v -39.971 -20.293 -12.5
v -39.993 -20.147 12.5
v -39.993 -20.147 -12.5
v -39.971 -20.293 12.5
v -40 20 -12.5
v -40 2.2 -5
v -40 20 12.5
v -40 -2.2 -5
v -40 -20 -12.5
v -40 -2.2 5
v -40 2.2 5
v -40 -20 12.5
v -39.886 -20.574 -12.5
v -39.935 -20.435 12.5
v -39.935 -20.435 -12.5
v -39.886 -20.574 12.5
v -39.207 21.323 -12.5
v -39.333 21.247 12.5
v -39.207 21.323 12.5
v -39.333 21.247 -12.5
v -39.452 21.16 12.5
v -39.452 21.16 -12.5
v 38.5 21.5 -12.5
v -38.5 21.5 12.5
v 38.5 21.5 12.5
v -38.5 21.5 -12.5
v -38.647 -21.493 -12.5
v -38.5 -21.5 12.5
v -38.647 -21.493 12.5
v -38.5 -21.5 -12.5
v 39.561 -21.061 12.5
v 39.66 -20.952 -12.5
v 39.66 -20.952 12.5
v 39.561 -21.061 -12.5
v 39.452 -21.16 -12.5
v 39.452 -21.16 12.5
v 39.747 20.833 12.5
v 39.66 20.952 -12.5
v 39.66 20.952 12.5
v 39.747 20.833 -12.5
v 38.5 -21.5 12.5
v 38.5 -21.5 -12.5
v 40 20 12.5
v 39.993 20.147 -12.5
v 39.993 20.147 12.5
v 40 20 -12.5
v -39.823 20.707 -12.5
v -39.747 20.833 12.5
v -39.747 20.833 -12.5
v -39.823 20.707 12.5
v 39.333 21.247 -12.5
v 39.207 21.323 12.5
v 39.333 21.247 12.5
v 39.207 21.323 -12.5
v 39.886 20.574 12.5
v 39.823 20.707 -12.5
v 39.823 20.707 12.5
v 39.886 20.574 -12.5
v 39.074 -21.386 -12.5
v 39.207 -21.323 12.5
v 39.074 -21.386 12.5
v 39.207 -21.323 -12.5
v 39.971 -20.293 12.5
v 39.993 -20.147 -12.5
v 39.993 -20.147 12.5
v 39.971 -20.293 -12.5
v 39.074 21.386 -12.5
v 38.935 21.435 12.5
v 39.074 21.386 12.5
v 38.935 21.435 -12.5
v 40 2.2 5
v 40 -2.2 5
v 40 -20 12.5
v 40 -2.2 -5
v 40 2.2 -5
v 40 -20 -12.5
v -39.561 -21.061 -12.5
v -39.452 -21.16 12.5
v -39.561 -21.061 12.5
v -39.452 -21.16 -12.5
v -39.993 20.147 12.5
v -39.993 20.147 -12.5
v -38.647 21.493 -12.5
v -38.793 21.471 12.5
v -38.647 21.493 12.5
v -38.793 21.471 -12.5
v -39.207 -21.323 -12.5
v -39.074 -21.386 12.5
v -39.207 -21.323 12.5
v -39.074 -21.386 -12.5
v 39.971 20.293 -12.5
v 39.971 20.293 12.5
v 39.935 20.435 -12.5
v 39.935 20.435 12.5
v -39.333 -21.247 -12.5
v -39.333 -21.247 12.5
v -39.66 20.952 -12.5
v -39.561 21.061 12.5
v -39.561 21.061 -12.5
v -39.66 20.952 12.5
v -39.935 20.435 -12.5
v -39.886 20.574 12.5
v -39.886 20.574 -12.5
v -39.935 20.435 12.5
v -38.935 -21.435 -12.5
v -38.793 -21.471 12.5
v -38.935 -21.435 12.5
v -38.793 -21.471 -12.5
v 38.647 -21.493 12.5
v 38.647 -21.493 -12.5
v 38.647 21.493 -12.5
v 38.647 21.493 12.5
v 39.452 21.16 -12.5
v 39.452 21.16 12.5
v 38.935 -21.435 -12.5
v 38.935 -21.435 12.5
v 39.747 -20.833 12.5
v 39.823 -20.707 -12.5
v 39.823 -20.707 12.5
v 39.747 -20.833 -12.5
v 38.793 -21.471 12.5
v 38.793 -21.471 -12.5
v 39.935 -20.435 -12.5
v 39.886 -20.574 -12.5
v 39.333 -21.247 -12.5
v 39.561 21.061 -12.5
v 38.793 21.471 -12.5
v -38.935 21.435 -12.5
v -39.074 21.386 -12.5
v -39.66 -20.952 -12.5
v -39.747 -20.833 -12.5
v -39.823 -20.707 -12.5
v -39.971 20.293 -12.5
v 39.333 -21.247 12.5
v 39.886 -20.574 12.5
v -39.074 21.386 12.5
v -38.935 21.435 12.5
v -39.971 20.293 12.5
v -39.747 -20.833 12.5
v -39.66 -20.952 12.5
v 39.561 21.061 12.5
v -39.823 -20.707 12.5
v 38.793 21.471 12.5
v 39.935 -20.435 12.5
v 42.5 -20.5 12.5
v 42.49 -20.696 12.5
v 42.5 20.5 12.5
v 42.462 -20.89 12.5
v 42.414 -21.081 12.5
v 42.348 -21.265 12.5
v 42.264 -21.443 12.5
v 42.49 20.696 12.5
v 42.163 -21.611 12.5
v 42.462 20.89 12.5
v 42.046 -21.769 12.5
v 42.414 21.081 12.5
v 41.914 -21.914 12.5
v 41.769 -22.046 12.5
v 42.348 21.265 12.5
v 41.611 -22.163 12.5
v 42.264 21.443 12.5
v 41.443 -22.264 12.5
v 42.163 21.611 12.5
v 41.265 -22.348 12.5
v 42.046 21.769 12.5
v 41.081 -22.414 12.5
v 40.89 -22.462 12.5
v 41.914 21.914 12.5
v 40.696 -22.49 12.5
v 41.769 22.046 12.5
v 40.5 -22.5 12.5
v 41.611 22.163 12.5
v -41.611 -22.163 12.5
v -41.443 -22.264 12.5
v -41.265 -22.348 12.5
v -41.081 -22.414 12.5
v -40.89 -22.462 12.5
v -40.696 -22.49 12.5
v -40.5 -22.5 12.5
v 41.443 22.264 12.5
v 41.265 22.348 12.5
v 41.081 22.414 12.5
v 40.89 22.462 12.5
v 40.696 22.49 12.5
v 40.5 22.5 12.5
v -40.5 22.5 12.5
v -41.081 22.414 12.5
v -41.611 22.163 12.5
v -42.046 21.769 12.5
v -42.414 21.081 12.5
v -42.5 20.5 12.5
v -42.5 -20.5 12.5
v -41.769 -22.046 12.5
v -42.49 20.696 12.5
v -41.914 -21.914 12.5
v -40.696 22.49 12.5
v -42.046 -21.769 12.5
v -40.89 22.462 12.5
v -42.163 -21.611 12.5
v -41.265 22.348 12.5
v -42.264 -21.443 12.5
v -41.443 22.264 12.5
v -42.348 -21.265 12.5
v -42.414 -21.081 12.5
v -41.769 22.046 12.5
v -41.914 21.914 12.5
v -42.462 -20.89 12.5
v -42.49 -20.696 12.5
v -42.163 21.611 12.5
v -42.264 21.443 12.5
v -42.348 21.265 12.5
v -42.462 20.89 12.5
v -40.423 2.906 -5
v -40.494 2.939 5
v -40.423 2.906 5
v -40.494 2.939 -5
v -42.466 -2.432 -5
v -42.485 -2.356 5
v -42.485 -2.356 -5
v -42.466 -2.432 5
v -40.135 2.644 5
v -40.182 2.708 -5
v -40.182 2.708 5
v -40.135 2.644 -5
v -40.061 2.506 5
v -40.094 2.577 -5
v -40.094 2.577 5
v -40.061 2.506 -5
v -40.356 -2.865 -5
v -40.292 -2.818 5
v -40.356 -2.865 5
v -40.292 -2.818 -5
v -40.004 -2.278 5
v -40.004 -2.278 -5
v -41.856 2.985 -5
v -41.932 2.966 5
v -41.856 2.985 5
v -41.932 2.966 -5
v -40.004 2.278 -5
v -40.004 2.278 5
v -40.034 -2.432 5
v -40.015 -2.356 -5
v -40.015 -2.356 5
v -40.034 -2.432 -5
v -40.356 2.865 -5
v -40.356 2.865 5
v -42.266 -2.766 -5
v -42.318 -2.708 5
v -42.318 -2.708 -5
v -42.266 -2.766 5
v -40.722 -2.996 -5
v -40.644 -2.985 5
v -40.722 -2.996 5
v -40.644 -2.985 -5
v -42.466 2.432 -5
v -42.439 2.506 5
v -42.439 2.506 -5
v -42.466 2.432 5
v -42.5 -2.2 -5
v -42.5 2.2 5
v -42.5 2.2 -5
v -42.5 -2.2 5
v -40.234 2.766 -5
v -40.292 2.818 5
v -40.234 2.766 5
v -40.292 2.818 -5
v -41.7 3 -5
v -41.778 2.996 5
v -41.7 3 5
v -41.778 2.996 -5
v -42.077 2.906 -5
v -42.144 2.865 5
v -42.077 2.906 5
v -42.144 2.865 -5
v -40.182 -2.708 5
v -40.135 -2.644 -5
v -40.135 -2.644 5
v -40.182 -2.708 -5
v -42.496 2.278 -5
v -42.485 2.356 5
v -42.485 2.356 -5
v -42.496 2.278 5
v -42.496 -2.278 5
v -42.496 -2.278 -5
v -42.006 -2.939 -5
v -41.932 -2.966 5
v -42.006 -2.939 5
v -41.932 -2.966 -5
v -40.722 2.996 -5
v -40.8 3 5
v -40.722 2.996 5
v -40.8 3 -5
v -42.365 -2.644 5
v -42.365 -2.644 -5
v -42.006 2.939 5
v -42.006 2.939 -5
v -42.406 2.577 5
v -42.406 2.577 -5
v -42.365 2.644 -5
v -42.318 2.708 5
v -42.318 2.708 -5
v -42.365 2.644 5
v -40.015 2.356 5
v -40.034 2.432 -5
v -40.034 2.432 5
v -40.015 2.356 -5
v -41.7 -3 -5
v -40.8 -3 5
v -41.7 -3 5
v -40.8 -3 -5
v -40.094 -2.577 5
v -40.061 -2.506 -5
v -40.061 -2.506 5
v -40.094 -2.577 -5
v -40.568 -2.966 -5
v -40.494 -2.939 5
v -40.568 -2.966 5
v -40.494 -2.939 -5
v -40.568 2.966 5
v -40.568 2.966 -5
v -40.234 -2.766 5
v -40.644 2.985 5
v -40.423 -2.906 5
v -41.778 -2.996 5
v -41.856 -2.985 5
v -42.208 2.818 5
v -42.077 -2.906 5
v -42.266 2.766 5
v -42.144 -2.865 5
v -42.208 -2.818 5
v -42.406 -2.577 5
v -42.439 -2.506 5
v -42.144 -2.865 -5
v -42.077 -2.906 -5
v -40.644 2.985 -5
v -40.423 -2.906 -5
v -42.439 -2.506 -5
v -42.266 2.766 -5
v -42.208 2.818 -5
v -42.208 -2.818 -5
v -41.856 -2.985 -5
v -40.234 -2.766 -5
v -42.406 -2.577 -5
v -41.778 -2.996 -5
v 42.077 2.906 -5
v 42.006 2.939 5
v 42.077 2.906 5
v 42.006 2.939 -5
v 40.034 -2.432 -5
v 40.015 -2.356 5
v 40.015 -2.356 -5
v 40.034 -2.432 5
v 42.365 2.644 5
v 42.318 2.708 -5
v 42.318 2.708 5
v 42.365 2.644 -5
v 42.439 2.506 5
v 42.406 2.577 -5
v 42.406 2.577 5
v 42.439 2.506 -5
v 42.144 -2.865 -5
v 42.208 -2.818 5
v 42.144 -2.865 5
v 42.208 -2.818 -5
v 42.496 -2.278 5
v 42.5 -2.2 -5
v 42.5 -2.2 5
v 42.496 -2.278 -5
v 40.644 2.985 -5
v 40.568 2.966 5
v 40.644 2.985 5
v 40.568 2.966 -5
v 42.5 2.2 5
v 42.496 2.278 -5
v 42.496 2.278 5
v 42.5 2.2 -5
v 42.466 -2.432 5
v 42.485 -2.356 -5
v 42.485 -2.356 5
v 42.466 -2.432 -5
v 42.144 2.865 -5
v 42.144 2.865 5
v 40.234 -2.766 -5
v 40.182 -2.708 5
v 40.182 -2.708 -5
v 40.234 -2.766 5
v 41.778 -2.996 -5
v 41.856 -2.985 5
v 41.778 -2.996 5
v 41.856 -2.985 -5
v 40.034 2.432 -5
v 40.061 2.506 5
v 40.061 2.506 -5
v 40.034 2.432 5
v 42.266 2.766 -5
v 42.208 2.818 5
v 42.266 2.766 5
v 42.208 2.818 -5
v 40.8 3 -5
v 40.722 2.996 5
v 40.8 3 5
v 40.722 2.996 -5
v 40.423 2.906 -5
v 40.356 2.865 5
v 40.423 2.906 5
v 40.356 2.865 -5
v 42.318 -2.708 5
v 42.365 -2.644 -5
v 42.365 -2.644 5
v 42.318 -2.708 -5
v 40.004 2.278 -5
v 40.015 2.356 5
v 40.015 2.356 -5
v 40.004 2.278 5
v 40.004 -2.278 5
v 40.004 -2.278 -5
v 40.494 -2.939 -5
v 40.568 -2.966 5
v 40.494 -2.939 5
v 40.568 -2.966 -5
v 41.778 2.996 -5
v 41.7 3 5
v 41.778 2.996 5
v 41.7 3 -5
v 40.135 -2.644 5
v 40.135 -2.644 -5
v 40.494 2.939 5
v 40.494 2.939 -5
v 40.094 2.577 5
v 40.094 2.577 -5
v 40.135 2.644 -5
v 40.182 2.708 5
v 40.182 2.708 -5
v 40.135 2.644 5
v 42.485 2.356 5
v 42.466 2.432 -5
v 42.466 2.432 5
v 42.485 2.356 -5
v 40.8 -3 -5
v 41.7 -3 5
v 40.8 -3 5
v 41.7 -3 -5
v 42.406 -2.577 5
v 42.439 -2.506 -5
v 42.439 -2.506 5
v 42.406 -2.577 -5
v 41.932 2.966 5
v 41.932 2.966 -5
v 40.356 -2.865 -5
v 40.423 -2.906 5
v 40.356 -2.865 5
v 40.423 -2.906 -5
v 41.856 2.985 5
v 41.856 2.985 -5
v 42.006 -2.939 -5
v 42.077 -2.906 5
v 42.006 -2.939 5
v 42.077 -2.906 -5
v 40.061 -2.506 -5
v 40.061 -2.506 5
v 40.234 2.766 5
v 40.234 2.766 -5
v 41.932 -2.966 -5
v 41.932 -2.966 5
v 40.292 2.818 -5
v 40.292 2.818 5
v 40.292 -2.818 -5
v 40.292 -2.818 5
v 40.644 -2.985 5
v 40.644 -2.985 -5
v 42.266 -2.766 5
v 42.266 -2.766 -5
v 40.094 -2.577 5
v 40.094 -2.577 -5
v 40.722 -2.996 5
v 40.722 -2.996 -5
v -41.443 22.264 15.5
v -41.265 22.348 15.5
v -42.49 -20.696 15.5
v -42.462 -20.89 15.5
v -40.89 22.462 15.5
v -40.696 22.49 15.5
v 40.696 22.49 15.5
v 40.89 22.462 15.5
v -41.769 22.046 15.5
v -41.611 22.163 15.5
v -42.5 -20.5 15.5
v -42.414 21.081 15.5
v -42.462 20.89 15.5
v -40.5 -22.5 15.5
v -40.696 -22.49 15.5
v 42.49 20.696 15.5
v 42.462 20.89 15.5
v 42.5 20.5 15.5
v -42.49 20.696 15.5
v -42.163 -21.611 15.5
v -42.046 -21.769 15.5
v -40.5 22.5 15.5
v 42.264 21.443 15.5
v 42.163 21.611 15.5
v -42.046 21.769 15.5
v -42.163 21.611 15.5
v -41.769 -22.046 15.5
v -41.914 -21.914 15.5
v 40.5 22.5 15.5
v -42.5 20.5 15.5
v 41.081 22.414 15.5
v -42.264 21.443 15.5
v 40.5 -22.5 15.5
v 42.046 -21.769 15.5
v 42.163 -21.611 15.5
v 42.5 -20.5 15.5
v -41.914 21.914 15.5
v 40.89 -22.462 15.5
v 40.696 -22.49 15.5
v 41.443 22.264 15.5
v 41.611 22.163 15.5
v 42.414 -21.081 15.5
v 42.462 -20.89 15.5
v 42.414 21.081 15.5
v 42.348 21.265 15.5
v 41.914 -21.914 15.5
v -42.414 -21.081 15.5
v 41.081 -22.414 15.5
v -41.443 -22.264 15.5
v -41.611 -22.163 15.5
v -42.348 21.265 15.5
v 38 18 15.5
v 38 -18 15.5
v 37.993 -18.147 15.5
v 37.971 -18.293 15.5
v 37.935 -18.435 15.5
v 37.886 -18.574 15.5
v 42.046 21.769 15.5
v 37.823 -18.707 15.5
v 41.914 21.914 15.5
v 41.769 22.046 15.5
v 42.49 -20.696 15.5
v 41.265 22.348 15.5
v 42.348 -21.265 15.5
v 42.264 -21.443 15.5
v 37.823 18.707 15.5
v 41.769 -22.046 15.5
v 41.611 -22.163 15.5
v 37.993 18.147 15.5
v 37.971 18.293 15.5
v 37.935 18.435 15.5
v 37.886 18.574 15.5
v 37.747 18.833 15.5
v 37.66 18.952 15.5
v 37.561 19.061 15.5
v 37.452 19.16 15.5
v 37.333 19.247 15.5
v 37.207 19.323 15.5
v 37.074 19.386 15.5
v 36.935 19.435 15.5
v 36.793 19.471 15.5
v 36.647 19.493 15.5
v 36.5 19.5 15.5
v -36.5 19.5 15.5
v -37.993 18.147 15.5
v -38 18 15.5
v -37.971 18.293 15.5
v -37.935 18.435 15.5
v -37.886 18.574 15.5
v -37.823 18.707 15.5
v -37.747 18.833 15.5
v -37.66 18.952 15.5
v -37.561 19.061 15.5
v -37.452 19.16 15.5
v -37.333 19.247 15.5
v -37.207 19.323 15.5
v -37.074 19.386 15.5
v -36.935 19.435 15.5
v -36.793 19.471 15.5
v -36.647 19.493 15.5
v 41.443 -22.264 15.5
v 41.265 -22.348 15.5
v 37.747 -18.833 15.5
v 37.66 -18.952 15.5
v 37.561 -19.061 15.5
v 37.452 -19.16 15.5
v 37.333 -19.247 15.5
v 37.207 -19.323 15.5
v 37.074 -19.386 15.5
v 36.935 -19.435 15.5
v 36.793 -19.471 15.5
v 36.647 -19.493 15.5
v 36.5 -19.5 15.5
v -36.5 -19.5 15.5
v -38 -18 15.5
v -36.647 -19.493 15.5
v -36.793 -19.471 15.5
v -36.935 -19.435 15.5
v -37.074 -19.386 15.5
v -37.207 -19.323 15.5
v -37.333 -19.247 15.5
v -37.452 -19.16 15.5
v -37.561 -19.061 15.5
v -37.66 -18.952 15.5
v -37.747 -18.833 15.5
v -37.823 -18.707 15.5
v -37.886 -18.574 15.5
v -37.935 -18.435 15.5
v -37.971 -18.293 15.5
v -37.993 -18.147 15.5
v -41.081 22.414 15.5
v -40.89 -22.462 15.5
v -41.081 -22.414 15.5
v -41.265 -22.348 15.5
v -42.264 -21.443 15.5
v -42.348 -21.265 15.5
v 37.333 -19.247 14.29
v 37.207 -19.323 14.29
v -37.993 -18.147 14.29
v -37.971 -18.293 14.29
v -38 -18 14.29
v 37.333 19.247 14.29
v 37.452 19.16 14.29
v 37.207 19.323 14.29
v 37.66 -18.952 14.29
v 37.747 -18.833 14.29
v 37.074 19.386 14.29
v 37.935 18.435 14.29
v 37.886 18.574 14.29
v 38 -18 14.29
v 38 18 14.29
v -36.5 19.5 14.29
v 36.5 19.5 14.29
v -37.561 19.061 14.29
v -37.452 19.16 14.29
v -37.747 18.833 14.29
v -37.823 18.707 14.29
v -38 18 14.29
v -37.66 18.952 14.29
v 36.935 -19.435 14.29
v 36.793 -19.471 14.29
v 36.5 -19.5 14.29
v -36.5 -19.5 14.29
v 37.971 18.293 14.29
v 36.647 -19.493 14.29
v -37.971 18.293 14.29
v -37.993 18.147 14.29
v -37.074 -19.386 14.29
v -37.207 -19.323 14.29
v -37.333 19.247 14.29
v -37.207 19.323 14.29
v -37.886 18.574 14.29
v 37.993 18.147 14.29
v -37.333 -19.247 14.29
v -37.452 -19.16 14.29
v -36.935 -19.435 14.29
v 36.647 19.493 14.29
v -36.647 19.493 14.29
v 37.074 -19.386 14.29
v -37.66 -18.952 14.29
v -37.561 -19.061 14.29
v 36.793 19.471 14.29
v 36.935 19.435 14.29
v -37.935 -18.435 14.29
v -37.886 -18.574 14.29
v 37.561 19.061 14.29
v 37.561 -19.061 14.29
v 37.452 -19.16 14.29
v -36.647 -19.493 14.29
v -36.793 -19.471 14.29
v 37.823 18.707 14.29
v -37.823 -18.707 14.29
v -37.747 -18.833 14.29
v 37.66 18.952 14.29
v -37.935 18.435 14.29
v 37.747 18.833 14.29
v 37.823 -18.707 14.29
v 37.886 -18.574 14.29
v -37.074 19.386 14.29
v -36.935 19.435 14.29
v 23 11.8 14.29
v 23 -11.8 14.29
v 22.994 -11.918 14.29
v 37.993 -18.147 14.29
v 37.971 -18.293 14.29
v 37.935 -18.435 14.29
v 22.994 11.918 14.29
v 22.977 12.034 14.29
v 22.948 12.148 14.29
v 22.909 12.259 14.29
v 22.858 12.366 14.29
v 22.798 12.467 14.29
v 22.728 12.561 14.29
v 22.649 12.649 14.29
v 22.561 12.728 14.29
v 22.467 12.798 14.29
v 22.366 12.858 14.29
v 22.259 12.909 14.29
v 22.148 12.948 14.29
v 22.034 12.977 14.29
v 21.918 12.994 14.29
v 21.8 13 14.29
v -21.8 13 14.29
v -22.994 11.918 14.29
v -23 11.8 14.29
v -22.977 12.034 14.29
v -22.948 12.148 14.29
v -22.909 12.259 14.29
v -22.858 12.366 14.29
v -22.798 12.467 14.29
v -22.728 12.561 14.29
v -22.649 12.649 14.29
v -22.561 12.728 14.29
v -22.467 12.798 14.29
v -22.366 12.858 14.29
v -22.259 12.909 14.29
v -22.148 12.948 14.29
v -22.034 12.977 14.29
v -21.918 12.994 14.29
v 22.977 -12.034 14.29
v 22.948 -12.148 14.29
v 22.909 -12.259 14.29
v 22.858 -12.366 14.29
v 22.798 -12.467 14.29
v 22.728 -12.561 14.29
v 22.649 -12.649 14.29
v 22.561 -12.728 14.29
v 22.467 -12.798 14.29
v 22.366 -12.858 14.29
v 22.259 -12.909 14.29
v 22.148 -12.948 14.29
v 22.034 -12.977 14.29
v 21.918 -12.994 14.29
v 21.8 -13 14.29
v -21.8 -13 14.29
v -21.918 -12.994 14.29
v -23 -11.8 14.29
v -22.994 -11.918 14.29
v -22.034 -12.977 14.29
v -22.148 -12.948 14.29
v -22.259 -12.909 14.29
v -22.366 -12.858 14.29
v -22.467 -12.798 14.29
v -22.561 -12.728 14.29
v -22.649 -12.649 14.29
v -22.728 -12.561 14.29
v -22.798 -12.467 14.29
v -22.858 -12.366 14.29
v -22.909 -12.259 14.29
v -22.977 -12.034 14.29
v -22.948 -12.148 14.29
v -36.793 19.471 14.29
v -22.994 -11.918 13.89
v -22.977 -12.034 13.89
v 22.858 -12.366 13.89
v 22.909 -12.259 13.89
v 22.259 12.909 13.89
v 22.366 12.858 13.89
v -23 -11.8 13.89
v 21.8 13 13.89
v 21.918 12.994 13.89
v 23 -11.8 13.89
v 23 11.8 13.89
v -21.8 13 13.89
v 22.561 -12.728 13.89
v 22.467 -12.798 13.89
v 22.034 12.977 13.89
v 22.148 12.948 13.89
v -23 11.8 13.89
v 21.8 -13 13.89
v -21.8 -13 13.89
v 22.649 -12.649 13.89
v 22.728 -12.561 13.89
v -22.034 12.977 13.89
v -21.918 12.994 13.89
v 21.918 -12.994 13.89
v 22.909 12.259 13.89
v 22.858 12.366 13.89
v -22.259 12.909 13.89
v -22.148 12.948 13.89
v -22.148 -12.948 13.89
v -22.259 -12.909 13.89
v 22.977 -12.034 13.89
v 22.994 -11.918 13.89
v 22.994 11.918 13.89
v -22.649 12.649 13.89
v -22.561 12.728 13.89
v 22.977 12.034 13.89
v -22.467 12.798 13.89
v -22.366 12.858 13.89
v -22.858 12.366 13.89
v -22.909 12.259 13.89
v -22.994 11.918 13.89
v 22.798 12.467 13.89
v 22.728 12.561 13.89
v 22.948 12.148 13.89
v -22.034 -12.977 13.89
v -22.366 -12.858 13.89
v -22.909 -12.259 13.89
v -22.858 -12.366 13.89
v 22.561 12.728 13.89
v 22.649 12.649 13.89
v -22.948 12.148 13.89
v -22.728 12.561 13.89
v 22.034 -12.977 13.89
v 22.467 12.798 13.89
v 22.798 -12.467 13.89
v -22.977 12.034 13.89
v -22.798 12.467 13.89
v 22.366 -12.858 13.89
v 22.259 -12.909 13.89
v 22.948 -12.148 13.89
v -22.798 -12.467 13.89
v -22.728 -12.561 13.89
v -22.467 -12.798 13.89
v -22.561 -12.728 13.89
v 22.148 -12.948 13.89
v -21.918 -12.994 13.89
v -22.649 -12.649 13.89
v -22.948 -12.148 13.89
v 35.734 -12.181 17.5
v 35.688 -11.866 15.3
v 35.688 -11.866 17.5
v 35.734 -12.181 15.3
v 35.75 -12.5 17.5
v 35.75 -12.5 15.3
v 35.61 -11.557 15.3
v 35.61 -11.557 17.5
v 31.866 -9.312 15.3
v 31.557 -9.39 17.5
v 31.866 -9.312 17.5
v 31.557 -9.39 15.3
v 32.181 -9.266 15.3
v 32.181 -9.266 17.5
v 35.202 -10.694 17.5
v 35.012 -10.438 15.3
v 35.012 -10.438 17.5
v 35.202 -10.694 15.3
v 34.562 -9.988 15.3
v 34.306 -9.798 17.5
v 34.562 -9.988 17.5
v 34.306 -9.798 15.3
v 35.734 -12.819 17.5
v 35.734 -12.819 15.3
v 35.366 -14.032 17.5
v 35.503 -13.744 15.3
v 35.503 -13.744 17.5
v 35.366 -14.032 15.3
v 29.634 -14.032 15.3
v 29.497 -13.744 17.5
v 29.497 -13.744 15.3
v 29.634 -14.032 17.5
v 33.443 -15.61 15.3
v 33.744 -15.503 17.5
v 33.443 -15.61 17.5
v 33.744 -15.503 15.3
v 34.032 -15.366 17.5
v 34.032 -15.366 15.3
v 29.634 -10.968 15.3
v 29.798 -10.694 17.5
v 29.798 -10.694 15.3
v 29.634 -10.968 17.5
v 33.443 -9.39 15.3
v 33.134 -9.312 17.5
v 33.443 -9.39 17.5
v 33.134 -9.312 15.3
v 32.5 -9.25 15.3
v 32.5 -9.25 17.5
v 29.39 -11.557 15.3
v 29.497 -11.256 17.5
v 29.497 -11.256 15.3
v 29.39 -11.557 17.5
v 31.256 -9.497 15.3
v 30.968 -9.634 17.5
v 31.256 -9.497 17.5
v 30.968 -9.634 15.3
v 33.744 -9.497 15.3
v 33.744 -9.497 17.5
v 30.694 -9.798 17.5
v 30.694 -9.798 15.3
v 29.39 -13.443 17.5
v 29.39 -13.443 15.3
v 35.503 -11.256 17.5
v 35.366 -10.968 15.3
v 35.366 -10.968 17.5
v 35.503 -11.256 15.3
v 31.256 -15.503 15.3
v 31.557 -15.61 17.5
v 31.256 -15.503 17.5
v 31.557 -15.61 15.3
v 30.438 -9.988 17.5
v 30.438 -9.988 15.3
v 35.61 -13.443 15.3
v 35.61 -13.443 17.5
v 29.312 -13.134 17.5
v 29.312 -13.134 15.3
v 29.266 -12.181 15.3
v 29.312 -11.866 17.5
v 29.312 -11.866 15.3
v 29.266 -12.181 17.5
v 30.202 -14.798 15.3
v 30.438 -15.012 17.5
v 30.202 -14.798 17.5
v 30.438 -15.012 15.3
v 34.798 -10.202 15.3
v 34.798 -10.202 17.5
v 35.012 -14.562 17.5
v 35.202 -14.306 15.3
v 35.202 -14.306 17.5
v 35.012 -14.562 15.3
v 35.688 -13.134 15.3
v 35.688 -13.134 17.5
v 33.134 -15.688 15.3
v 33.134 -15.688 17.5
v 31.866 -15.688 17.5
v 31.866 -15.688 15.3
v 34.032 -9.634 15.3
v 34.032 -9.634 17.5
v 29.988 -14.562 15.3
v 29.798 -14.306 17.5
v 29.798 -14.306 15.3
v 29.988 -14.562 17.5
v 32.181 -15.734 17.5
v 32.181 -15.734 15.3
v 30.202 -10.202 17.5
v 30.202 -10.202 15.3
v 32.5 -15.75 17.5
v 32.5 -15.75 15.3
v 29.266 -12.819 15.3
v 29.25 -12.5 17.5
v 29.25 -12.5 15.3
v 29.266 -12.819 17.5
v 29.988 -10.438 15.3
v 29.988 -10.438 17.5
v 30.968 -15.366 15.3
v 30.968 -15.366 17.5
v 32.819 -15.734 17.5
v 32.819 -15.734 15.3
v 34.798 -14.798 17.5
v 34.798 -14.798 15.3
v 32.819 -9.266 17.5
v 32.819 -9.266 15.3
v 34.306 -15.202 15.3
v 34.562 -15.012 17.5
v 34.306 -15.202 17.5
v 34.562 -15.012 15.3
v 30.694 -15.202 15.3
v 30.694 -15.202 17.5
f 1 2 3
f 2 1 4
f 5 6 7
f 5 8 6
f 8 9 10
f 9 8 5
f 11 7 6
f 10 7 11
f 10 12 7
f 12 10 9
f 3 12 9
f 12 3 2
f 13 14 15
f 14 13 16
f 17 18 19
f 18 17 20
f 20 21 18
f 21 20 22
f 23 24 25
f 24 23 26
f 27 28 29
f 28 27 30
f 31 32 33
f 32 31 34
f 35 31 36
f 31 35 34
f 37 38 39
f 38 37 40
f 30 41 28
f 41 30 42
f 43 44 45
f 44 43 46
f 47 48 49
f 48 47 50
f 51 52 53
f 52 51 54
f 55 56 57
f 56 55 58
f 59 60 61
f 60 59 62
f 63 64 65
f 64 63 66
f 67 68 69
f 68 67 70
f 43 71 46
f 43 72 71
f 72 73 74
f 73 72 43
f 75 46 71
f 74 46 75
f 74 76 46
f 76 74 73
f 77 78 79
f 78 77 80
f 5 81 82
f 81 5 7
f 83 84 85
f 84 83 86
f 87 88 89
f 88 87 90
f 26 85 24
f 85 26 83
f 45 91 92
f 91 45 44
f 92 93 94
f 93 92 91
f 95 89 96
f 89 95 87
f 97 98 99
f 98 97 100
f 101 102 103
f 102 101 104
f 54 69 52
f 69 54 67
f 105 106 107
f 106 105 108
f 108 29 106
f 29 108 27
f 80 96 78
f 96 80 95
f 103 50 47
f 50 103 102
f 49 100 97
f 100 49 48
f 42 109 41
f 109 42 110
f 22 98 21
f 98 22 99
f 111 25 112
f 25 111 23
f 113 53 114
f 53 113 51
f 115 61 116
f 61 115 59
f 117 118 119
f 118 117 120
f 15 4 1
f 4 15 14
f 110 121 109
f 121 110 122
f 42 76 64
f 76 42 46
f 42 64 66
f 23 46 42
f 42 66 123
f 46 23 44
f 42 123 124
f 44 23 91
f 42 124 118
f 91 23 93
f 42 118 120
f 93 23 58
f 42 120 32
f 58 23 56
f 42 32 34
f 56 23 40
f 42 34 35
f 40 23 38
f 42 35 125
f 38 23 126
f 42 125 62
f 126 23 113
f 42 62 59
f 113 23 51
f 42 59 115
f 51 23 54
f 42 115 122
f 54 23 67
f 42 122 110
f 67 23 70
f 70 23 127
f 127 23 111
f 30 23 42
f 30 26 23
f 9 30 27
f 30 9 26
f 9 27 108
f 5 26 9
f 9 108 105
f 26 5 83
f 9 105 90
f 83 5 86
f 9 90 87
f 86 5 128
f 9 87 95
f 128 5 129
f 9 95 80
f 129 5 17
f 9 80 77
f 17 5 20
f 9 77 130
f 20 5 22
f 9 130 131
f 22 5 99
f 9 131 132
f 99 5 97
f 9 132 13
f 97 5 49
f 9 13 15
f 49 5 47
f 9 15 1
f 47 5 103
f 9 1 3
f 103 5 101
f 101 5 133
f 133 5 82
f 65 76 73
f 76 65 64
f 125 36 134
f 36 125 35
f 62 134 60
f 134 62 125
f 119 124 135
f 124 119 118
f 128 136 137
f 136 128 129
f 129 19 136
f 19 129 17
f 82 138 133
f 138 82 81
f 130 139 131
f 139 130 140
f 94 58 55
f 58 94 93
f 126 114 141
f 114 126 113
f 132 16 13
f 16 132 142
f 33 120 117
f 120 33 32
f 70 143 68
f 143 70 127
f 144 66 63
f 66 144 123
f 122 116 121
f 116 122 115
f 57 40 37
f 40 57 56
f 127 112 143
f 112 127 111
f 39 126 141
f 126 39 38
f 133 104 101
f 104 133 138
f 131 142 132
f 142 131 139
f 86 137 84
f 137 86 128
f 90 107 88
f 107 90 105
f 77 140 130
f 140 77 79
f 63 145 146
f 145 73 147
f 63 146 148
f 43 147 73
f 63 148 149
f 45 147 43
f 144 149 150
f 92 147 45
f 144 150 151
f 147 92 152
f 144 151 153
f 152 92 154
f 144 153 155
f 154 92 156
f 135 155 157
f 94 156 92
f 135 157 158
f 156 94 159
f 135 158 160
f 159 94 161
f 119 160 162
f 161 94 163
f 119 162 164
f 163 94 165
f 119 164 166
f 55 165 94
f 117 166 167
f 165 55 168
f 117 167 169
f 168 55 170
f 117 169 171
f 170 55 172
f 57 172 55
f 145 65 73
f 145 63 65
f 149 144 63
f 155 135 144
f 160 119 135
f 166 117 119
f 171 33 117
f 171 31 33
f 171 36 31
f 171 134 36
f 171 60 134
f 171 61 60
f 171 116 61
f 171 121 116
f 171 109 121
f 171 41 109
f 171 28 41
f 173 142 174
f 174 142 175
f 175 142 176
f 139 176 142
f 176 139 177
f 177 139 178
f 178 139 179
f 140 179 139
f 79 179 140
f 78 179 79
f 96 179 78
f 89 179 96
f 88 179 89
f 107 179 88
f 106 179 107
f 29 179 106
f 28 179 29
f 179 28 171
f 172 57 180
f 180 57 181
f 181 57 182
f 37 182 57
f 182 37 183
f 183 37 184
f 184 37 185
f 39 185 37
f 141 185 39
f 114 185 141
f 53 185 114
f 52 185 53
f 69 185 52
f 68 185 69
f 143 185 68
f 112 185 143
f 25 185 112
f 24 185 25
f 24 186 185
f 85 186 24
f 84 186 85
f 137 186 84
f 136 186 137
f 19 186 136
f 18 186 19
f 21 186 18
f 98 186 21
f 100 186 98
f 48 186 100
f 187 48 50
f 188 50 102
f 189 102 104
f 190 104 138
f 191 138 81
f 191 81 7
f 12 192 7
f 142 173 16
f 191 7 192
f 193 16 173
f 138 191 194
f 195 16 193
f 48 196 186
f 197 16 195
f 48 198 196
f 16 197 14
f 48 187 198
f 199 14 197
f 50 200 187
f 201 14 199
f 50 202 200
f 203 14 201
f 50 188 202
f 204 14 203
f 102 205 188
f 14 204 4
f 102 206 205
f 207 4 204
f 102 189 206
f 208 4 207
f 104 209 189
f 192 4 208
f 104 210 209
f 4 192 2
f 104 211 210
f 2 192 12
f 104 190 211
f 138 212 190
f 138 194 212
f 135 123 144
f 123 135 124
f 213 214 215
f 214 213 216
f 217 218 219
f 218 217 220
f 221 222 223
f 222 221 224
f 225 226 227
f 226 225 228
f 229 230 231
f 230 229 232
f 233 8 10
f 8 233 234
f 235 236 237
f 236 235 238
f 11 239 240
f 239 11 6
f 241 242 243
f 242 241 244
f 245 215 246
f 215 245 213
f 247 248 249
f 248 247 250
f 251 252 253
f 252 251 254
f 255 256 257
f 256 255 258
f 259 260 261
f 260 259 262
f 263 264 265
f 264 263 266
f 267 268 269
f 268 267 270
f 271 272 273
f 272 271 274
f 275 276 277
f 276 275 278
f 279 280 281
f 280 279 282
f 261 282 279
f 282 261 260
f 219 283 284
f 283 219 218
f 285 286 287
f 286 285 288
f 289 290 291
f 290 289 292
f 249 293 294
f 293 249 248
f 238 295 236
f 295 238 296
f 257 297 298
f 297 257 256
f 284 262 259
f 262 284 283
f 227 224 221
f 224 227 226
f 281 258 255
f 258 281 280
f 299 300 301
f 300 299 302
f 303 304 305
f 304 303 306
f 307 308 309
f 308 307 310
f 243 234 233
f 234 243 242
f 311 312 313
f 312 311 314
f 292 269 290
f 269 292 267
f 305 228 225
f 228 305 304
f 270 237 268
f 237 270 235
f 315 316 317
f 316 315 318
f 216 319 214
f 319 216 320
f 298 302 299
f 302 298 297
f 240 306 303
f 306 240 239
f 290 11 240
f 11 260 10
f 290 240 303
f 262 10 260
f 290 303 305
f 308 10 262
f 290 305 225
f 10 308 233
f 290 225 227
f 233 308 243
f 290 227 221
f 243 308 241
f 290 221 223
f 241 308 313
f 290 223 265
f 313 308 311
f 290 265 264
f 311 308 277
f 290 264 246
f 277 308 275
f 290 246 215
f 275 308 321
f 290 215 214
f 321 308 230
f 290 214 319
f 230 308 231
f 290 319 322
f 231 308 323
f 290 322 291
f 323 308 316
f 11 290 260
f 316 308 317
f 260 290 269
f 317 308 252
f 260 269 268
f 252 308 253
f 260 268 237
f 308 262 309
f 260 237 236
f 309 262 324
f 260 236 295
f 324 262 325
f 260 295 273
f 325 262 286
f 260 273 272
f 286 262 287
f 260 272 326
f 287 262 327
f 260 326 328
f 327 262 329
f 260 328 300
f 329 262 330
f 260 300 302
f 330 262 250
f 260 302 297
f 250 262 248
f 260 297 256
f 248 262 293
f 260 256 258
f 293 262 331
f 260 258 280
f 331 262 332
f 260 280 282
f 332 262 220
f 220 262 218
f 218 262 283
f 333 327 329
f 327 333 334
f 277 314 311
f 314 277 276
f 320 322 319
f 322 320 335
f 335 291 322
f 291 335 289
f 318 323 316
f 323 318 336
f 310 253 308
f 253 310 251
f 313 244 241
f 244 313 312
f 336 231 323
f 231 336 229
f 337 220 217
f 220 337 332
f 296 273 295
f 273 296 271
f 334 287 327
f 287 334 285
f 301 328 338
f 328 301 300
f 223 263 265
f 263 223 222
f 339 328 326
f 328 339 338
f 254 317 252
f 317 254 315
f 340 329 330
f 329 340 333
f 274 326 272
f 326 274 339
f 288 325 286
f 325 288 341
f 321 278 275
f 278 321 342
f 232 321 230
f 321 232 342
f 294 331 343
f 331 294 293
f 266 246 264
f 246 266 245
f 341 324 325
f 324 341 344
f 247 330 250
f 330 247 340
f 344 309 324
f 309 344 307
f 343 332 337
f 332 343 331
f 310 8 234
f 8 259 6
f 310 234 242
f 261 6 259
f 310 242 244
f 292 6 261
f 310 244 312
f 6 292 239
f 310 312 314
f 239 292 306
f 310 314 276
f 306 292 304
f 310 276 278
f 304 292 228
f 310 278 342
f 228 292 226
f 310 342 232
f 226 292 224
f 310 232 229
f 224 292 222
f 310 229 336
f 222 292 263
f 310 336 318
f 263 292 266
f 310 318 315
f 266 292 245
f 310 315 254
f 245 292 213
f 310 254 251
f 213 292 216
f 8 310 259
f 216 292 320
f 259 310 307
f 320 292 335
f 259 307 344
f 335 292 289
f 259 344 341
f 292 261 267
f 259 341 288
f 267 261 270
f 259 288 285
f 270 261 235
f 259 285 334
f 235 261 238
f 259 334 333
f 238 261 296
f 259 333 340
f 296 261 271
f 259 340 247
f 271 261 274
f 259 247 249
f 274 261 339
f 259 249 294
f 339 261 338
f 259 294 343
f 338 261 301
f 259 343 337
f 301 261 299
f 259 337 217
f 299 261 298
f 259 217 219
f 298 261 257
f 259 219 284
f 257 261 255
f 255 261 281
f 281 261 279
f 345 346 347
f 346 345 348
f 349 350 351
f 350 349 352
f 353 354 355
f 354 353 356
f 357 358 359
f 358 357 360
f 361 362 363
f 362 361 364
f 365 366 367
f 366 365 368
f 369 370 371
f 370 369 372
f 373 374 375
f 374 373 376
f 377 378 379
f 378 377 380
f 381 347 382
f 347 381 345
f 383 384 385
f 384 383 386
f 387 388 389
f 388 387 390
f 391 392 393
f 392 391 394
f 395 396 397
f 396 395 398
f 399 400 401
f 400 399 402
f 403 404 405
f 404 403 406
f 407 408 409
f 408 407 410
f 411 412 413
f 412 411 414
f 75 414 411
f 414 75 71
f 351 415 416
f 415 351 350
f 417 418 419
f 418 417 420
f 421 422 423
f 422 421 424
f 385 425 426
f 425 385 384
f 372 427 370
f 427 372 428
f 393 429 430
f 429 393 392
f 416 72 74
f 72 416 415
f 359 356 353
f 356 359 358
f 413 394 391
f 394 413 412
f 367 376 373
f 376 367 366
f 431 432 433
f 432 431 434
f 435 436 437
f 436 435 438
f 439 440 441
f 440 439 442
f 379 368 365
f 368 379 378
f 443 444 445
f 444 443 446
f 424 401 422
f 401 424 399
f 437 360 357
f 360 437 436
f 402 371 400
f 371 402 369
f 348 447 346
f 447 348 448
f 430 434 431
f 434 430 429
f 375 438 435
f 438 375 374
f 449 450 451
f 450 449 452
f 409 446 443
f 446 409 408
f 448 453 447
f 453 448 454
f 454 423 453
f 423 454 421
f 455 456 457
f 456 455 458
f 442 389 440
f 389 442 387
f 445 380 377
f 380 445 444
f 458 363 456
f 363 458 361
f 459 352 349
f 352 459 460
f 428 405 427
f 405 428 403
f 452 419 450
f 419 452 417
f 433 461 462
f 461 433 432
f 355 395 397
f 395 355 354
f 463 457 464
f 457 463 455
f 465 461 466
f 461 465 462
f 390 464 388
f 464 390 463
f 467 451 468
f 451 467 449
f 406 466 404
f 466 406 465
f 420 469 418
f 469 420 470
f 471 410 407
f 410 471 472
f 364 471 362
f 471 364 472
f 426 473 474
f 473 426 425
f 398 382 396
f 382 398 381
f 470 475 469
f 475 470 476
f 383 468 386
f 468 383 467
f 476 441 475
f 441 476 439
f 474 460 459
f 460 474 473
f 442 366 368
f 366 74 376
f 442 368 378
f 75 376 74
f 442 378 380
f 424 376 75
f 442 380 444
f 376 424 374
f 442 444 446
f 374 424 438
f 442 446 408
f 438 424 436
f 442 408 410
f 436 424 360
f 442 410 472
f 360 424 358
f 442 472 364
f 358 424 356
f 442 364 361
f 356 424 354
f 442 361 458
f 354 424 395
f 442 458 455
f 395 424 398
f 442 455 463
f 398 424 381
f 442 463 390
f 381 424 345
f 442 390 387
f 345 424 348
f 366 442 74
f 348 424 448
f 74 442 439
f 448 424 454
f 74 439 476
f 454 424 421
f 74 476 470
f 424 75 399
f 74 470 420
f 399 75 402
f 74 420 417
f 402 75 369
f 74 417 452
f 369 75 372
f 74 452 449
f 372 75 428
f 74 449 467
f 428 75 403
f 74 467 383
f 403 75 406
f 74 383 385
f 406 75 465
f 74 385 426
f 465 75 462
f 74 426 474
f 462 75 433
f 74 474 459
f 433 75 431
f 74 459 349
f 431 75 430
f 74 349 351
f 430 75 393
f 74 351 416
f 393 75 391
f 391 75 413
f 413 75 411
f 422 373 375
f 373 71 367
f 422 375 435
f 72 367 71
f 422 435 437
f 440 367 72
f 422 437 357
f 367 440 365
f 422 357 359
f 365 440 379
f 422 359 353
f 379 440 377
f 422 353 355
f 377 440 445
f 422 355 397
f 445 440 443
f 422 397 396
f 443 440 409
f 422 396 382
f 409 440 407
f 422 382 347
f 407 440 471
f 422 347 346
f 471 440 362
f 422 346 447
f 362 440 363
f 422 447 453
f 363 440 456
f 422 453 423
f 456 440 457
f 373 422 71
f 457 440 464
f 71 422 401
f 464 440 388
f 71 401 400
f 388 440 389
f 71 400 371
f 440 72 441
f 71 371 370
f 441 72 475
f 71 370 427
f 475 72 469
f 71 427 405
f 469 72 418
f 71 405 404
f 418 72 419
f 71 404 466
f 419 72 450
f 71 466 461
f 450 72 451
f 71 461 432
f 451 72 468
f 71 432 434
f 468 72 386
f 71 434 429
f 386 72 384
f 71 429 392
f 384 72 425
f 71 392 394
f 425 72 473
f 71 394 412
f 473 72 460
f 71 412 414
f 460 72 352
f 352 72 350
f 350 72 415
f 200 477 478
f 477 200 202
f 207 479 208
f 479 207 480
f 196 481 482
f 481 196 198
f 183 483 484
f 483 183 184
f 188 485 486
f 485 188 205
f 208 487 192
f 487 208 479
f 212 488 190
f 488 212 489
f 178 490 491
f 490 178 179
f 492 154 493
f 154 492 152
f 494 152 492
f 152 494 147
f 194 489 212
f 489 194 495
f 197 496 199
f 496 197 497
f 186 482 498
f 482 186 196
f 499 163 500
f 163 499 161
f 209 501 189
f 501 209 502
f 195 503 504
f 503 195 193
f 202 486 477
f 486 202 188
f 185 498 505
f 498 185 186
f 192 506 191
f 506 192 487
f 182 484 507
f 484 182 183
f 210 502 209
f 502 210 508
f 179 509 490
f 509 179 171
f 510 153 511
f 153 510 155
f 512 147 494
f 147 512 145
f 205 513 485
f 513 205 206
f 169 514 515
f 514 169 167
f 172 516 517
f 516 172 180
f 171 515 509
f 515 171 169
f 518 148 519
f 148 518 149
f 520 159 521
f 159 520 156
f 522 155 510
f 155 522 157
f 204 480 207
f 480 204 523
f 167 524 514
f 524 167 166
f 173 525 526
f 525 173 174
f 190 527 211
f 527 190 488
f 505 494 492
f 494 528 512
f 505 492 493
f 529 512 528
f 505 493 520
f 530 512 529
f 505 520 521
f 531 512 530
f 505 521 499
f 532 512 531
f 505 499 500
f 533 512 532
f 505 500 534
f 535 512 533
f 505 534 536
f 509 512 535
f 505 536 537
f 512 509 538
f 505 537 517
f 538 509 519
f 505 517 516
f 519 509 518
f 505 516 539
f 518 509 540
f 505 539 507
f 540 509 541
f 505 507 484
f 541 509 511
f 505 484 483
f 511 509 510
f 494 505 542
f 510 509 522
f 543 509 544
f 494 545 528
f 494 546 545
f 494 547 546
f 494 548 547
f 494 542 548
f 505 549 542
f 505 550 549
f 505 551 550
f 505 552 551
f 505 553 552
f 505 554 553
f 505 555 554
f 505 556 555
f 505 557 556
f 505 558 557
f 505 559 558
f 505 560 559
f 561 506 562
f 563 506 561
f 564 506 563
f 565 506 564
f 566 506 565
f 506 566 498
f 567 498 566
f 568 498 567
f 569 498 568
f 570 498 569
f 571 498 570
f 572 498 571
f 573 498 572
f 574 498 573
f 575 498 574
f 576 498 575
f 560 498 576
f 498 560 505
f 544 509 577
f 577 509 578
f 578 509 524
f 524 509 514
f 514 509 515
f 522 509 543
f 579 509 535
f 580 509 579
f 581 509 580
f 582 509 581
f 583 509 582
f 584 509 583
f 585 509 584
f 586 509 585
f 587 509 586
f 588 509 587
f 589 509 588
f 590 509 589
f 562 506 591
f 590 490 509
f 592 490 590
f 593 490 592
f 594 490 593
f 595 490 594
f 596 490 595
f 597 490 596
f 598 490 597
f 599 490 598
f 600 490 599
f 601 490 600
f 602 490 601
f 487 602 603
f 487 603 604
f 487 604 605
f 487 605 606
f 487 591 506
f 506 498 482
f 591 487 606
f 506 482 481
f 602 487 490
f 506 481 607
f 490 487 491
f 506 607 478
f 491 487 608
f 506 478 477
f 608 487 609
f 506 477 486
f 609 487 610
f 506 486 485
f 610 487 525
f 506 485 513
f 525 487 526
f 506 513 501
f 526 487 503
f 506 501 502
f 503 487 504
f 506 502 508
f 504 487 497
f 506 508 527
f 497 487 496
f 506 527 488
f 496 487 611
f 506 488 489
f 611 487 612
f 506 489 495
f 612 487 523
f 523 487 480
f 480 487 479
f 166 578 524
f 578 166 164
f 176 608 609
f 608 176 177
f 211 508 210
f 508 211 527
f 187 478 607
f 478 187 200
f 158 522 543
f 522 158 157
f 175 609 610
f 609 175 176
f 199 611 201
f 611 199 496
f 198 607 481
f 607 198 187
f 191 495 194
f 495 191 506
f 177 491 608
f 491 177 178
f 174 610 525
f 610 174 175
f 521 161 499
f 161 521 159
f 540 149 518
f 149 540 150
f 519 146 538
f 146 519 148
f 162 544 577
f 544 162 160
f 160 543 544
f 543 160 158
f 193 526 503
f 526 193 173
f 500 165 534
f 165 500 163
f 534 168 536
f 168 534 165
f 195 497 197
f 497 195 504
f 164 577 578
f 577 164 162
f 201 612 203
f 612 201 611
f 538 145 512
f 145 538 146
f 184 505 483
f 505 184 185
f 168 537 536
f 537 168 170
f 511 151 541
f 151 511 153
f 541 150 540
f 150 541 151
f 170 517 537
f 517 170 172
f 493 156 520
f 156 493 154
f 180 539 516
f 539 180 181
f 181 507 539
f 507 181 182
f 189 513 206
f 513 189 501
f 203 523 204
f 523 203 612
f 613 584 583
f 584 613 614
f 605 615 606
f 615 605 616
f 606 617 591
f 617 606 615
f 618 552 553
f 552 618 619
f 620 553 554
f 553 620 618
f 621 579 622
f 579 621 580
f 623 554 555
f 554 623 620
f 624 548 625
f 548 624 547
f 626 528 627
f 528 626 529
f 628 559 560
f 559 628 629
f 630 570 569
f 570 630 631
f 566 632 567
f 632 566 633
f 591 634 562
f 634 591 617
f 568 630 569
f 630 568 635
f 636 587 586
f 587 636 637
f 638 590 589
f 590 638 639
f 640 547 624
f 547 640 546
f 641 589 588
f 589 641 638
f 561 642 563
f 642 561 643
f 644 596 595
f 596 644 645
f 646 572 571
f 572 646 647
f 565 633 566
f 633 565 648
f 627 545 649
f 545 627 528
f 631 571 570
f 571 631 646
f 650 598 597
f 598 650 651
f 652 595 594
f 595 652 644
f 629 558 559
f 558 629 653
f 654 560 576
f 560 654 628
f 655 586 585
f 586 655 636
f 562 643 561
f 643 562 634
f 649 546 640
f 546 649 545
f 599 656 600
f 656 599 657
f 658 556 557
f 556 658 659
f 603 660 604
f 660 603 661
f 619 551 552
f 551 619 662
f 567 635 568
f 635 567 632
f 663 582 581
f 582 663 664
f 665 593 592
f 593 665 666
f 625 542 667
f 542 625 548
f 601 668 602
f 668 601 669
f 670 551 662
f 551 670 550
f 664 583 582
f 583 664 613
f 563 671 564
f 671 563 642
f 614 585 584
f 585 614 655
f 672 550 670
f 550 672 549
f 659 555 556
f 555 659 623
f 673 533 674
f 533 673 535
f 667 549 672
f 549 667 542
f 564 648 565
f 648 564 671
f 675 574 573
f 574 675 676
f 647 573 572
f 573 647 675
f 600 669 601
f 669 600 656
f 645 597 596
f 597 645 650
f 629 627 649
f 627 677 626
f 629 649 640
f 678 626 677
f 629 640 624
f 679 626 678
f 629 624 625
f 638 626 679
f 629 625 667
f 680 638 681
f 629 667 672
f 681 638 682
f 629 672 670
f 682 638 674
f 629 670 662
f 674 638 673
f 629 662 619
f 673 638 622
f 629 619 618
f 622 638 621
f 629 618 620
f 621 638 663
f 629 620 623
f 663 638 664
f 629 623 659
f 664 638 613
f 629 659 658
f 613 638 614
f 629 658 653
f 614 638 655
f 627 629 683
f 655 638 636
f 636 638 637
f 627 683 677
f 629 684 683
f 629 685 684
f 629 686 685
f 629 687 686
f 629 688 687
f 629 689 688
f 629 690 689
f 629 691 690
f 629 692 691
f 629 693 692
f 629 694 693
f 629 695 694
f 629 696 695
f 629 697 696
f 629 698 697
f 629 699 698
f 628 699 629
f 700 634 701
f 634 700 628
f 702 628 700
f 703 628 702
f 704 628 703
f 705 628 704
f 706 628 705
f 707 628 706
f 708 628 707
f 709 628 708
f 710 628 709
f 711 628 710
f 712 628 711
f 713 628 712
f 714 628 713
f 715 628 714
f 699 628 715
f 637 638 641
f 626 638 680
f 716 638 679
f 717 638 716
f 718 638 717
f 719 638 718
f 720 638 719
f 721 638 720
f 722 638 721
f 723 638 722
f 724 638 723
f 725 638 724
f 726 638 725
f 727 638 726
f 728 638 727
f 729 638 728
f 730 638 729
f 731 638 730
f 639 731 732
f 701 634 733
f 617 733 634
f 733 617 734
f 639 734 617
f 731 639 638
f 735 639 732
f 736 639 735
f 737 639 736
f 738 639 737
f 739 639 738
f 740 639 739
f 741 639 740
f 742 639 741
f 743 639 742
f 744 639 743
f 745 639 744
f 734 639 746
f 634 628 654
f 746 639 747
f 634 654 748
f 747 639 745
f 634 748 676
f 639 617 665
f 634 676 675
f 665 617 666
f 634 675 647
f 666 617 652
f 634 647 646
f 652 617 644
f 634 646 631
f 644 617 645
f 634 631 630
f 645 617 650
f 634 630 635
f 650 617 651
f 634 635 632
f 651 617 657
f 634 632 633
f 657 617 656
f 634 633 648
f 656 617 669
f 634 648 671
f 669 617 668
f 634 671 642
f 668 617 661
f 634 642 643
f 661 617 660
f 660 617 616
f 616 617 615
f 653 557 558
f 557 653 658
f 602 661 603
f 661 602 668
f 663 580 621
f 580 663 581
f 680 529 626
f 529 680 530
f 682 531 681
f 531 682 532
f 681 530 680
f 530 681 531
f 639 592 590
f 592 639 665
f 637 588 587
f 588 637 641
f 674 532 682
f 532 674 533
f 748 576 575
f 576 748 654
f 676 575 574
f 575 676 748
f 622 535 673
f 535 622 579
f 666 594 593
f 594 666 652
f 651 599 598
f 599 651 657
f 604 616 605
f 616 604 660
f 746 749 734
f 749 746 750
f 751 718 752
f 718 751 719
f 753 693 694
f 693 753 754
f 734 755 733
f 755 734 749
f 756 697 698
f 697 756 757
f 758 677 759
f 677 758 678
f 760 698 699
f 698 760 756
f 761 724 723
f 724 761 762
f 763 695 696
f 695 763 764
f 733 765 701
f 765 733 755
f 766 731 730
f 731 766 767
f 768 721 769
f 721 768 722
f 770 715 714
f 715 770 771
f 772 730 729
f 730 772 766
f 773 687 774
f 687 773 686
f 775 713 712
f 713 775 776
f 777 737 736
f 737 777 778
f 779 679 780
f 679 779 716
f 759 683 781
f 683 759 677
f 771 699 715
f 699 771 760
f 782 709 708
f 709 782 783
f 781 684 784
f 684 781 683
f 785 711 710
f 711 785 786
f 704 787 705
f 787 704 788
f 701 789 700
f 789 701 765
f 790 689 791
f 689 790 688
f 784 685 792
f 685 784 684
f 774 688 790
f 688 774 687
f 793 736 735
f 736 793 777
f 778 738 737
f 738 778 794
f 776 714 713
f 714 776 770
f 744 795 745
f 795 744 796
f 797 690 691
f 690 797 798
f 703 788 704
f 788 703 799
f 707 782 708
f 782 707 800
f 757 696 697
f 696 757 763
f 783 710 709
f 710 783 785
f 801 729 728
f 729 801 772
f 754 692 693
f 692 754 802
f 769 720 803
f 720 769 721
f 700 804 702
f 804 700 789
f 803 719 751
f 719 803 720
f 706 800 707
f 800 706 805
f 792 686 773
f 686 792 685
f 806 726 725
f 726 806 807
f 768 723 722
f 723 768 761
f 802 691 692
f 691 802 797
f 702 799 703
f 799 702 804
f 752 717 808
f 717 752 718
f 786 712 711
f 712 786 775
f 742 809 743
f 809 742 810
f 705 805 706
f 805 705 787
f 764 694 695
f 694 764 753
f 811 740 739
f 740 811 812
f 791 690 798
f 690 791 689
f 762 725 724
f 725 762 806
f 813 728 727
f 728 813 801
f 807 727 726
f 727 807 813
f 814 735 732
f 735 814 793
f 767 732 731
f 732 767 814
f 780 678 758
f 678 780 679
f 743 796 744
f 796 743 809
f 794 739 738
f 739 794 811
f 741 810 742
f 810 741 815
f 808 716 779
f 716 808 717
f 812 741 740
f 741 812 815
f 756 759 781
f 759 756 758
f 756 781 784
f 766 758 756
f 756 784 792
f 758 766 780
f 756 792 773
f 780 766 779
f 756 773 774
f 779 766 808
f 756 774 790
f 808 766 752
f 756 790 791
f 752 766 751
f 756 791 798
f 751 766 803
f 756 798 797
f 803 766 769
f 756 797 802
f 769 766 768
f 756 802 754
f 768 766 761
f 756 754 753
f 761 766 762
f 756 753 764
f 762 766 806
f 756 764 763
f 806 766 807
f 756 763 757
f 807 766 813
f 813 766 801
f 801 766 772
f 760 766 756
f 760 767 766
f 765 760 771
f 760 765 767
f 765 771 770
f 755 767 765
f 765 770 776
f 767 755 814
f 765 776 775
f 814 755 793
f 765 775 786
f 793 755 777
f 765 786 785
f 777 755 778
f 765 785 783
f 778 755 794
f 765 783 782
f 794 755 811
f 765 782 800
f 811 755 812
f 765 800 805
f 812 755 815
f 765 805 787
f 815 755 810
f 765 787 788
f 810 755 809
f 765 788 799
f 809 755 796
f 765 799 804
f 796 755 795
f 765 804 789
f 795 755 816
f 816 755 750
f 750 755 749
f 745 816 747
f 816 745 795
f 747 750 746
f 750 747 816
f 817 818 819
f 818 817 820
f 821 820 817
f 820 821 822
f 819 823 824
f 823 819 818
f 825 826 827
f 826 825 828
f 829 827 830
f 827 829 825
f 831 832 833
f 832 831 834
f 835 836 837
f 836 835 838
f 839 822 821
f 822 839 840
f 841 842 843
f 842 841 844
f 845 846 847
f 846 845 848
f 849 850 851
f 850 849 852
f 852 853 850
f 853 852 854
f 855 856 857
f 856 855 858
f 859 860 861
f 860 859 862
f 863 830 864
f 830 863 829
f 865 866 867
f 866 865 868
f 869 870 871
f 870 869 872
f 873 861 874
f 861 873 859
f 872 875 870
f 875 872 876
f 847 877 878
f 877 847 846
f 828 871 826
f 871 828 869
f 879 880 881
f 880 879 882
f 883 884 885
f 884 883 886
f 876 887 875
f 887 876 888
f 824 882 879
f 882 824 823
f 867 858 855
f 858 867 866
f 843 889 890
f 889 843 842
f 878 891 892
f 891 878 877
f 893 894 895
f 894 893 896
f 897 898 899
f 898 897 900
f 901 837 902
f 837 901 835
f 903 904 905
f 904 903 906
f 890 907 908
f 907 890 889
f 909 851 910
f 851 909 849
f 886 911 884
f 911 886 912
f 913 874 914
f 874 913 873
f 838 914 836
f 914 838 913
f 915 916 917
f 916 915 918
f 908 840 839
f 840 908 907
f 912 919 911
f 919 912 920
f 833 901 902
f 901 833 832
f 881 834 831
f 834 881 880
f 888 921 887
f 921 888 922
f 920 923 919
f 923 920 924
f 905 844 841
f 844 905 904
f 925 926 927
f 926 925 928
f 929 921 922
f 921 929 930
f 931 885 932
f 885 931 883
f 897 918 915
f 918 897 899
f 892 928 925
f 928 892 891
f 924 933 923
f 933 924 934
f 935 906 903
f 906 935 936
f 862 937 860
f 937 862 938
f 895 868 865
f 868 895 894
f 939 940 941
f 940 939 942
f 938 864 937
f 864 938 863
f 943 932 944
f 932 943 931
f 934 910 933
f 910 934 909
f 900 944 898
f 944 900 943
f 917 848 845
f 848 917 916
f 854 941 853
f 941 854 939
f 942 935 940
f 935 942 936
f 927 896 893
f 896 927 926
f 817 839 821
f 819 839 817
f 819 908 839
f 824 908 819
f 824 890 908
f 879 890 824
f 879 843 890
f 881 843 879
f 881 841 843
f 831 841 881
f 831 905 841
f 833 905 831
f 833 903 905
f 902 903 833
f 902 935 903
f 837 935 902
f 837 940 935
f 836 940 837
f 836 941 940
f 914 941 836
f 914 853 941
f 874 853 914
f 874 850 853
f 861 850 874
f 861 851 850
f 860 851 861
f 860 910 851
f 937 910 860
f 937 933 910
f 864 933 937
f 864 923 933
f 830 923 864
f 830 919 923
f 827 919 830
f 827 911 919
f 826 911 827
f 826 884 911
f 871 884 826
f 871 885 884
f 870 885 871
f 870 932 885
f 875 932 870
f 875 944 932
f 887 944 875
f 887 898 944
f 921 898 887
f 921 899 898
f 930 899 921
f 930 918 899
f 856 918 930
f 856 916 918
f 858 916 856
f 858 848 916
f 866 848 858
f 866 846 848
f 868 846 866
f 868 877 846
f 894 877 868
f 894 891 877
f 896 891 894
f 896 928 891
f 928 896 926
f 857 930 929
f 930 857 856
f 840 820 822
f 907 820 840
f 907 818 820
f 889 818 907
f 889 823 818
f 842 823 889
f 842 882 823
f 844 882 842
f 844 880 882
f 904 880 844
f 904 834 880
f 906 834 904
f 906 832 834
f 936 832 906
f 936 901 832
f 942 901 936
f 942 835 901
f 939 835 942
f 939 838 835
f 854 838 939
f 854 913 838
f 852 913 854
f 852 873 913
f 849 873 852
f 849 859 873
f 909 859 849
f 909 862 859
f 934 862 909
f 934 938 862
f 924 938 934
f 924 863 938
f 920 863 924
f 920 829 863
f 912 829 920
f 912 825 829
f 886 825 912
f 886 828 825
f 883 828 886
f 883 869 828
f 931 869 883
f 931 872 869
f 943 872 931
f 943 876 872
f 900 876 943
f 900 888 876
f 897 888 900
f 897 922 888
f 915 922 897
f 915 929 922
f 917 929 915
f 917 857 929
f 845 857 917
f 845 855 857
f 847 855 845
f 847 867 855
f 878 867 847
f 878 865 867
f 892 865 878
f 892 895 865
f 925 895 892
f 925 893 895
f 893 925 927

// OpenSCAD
$fn=64;

meter_body_w = 80;
meter_body_h = 43;
meter_body_d = 25;

front_bezel_w = 85;
front_bezel_h = 45;
front_bezel_t = 3;

face_recess_w = 76;
face_recess_h = 39;
face_recess_d = 1.2;

screen_w = 46;
screen_h = 26;
screen_d = 1.6;

button_d = 6.5;
button_h = 2.2;

tab_w = 10;
tab_h = 6;
tab_t = 2.5;

module rounded_rect_2d(w,h,r){
    r2 = min(r, min(w,h)/2);
    hull(){
        translate([ w/2 - r2,  h/2 - r2]) circle(r=r2);
        translate([-w/2 + r2,  h/2 - r2]) circle(r=r2);
        translate([ w/2 - r2, -h/2 + r2]) circle(r=r2);
        translate([-w/2 + r2, -h/2 + r2]) circle(r=r2);
    }
}

module rounded_box(w,h,d,r){
    linear_extrude(height=d, center=true)
        rounded_rect_2d(w,h,r);
}

module bezel(){
    difference(){
        translate([0,0,(meter_body_d/2 + front_bezel_t/2)])
            rounded_box(front_bezel_w, front_bezel_h, front_bezel_t, 2.0);

        translate([0,0,(meter_body_d/2 + front_bezel_t/2) + (front_bezel_t/2 - face_recess_d/2)])
            rounded_box(face_recess_w, face_recess_h, face_recess_d+0.02, 1.5);

        translate([0,0,(meter_body_d/2 + front_bezel_t/2) + (front_bezel_t/2 - screen_d/2)])
            rounded_box(screen_w, screen_h, screen_d+0.02, 1.2);
    }
}

module body(){
    union(){
        rounded_box(meter_body_w, meter_body_h, meter_body_d, 1.5);

        translate([-(meter_body_w/2 + tab_t/2), 0, 0])
            rounded_box(tab_t, tab_h, tab_w, 0.8);

        translate([(meter_body_w/2 + tab_t/2), 0, 0])
            rounded_box(tab_t, tab_h, tab_w, 0.8);
    }
}

module button(){
    translate([0,0,(meter_body_d/2 + front_bezel_t) - 0.2])
        cylinder(d=button_d, h=button_h, center=false);
}

module panel_meter(){
    union(){
        body();
        bezel();
        translate([front_bezel_w/2 - 10, -front_bezel_h/2 + 10, 0]) button();
    }
}

panel_meter();
